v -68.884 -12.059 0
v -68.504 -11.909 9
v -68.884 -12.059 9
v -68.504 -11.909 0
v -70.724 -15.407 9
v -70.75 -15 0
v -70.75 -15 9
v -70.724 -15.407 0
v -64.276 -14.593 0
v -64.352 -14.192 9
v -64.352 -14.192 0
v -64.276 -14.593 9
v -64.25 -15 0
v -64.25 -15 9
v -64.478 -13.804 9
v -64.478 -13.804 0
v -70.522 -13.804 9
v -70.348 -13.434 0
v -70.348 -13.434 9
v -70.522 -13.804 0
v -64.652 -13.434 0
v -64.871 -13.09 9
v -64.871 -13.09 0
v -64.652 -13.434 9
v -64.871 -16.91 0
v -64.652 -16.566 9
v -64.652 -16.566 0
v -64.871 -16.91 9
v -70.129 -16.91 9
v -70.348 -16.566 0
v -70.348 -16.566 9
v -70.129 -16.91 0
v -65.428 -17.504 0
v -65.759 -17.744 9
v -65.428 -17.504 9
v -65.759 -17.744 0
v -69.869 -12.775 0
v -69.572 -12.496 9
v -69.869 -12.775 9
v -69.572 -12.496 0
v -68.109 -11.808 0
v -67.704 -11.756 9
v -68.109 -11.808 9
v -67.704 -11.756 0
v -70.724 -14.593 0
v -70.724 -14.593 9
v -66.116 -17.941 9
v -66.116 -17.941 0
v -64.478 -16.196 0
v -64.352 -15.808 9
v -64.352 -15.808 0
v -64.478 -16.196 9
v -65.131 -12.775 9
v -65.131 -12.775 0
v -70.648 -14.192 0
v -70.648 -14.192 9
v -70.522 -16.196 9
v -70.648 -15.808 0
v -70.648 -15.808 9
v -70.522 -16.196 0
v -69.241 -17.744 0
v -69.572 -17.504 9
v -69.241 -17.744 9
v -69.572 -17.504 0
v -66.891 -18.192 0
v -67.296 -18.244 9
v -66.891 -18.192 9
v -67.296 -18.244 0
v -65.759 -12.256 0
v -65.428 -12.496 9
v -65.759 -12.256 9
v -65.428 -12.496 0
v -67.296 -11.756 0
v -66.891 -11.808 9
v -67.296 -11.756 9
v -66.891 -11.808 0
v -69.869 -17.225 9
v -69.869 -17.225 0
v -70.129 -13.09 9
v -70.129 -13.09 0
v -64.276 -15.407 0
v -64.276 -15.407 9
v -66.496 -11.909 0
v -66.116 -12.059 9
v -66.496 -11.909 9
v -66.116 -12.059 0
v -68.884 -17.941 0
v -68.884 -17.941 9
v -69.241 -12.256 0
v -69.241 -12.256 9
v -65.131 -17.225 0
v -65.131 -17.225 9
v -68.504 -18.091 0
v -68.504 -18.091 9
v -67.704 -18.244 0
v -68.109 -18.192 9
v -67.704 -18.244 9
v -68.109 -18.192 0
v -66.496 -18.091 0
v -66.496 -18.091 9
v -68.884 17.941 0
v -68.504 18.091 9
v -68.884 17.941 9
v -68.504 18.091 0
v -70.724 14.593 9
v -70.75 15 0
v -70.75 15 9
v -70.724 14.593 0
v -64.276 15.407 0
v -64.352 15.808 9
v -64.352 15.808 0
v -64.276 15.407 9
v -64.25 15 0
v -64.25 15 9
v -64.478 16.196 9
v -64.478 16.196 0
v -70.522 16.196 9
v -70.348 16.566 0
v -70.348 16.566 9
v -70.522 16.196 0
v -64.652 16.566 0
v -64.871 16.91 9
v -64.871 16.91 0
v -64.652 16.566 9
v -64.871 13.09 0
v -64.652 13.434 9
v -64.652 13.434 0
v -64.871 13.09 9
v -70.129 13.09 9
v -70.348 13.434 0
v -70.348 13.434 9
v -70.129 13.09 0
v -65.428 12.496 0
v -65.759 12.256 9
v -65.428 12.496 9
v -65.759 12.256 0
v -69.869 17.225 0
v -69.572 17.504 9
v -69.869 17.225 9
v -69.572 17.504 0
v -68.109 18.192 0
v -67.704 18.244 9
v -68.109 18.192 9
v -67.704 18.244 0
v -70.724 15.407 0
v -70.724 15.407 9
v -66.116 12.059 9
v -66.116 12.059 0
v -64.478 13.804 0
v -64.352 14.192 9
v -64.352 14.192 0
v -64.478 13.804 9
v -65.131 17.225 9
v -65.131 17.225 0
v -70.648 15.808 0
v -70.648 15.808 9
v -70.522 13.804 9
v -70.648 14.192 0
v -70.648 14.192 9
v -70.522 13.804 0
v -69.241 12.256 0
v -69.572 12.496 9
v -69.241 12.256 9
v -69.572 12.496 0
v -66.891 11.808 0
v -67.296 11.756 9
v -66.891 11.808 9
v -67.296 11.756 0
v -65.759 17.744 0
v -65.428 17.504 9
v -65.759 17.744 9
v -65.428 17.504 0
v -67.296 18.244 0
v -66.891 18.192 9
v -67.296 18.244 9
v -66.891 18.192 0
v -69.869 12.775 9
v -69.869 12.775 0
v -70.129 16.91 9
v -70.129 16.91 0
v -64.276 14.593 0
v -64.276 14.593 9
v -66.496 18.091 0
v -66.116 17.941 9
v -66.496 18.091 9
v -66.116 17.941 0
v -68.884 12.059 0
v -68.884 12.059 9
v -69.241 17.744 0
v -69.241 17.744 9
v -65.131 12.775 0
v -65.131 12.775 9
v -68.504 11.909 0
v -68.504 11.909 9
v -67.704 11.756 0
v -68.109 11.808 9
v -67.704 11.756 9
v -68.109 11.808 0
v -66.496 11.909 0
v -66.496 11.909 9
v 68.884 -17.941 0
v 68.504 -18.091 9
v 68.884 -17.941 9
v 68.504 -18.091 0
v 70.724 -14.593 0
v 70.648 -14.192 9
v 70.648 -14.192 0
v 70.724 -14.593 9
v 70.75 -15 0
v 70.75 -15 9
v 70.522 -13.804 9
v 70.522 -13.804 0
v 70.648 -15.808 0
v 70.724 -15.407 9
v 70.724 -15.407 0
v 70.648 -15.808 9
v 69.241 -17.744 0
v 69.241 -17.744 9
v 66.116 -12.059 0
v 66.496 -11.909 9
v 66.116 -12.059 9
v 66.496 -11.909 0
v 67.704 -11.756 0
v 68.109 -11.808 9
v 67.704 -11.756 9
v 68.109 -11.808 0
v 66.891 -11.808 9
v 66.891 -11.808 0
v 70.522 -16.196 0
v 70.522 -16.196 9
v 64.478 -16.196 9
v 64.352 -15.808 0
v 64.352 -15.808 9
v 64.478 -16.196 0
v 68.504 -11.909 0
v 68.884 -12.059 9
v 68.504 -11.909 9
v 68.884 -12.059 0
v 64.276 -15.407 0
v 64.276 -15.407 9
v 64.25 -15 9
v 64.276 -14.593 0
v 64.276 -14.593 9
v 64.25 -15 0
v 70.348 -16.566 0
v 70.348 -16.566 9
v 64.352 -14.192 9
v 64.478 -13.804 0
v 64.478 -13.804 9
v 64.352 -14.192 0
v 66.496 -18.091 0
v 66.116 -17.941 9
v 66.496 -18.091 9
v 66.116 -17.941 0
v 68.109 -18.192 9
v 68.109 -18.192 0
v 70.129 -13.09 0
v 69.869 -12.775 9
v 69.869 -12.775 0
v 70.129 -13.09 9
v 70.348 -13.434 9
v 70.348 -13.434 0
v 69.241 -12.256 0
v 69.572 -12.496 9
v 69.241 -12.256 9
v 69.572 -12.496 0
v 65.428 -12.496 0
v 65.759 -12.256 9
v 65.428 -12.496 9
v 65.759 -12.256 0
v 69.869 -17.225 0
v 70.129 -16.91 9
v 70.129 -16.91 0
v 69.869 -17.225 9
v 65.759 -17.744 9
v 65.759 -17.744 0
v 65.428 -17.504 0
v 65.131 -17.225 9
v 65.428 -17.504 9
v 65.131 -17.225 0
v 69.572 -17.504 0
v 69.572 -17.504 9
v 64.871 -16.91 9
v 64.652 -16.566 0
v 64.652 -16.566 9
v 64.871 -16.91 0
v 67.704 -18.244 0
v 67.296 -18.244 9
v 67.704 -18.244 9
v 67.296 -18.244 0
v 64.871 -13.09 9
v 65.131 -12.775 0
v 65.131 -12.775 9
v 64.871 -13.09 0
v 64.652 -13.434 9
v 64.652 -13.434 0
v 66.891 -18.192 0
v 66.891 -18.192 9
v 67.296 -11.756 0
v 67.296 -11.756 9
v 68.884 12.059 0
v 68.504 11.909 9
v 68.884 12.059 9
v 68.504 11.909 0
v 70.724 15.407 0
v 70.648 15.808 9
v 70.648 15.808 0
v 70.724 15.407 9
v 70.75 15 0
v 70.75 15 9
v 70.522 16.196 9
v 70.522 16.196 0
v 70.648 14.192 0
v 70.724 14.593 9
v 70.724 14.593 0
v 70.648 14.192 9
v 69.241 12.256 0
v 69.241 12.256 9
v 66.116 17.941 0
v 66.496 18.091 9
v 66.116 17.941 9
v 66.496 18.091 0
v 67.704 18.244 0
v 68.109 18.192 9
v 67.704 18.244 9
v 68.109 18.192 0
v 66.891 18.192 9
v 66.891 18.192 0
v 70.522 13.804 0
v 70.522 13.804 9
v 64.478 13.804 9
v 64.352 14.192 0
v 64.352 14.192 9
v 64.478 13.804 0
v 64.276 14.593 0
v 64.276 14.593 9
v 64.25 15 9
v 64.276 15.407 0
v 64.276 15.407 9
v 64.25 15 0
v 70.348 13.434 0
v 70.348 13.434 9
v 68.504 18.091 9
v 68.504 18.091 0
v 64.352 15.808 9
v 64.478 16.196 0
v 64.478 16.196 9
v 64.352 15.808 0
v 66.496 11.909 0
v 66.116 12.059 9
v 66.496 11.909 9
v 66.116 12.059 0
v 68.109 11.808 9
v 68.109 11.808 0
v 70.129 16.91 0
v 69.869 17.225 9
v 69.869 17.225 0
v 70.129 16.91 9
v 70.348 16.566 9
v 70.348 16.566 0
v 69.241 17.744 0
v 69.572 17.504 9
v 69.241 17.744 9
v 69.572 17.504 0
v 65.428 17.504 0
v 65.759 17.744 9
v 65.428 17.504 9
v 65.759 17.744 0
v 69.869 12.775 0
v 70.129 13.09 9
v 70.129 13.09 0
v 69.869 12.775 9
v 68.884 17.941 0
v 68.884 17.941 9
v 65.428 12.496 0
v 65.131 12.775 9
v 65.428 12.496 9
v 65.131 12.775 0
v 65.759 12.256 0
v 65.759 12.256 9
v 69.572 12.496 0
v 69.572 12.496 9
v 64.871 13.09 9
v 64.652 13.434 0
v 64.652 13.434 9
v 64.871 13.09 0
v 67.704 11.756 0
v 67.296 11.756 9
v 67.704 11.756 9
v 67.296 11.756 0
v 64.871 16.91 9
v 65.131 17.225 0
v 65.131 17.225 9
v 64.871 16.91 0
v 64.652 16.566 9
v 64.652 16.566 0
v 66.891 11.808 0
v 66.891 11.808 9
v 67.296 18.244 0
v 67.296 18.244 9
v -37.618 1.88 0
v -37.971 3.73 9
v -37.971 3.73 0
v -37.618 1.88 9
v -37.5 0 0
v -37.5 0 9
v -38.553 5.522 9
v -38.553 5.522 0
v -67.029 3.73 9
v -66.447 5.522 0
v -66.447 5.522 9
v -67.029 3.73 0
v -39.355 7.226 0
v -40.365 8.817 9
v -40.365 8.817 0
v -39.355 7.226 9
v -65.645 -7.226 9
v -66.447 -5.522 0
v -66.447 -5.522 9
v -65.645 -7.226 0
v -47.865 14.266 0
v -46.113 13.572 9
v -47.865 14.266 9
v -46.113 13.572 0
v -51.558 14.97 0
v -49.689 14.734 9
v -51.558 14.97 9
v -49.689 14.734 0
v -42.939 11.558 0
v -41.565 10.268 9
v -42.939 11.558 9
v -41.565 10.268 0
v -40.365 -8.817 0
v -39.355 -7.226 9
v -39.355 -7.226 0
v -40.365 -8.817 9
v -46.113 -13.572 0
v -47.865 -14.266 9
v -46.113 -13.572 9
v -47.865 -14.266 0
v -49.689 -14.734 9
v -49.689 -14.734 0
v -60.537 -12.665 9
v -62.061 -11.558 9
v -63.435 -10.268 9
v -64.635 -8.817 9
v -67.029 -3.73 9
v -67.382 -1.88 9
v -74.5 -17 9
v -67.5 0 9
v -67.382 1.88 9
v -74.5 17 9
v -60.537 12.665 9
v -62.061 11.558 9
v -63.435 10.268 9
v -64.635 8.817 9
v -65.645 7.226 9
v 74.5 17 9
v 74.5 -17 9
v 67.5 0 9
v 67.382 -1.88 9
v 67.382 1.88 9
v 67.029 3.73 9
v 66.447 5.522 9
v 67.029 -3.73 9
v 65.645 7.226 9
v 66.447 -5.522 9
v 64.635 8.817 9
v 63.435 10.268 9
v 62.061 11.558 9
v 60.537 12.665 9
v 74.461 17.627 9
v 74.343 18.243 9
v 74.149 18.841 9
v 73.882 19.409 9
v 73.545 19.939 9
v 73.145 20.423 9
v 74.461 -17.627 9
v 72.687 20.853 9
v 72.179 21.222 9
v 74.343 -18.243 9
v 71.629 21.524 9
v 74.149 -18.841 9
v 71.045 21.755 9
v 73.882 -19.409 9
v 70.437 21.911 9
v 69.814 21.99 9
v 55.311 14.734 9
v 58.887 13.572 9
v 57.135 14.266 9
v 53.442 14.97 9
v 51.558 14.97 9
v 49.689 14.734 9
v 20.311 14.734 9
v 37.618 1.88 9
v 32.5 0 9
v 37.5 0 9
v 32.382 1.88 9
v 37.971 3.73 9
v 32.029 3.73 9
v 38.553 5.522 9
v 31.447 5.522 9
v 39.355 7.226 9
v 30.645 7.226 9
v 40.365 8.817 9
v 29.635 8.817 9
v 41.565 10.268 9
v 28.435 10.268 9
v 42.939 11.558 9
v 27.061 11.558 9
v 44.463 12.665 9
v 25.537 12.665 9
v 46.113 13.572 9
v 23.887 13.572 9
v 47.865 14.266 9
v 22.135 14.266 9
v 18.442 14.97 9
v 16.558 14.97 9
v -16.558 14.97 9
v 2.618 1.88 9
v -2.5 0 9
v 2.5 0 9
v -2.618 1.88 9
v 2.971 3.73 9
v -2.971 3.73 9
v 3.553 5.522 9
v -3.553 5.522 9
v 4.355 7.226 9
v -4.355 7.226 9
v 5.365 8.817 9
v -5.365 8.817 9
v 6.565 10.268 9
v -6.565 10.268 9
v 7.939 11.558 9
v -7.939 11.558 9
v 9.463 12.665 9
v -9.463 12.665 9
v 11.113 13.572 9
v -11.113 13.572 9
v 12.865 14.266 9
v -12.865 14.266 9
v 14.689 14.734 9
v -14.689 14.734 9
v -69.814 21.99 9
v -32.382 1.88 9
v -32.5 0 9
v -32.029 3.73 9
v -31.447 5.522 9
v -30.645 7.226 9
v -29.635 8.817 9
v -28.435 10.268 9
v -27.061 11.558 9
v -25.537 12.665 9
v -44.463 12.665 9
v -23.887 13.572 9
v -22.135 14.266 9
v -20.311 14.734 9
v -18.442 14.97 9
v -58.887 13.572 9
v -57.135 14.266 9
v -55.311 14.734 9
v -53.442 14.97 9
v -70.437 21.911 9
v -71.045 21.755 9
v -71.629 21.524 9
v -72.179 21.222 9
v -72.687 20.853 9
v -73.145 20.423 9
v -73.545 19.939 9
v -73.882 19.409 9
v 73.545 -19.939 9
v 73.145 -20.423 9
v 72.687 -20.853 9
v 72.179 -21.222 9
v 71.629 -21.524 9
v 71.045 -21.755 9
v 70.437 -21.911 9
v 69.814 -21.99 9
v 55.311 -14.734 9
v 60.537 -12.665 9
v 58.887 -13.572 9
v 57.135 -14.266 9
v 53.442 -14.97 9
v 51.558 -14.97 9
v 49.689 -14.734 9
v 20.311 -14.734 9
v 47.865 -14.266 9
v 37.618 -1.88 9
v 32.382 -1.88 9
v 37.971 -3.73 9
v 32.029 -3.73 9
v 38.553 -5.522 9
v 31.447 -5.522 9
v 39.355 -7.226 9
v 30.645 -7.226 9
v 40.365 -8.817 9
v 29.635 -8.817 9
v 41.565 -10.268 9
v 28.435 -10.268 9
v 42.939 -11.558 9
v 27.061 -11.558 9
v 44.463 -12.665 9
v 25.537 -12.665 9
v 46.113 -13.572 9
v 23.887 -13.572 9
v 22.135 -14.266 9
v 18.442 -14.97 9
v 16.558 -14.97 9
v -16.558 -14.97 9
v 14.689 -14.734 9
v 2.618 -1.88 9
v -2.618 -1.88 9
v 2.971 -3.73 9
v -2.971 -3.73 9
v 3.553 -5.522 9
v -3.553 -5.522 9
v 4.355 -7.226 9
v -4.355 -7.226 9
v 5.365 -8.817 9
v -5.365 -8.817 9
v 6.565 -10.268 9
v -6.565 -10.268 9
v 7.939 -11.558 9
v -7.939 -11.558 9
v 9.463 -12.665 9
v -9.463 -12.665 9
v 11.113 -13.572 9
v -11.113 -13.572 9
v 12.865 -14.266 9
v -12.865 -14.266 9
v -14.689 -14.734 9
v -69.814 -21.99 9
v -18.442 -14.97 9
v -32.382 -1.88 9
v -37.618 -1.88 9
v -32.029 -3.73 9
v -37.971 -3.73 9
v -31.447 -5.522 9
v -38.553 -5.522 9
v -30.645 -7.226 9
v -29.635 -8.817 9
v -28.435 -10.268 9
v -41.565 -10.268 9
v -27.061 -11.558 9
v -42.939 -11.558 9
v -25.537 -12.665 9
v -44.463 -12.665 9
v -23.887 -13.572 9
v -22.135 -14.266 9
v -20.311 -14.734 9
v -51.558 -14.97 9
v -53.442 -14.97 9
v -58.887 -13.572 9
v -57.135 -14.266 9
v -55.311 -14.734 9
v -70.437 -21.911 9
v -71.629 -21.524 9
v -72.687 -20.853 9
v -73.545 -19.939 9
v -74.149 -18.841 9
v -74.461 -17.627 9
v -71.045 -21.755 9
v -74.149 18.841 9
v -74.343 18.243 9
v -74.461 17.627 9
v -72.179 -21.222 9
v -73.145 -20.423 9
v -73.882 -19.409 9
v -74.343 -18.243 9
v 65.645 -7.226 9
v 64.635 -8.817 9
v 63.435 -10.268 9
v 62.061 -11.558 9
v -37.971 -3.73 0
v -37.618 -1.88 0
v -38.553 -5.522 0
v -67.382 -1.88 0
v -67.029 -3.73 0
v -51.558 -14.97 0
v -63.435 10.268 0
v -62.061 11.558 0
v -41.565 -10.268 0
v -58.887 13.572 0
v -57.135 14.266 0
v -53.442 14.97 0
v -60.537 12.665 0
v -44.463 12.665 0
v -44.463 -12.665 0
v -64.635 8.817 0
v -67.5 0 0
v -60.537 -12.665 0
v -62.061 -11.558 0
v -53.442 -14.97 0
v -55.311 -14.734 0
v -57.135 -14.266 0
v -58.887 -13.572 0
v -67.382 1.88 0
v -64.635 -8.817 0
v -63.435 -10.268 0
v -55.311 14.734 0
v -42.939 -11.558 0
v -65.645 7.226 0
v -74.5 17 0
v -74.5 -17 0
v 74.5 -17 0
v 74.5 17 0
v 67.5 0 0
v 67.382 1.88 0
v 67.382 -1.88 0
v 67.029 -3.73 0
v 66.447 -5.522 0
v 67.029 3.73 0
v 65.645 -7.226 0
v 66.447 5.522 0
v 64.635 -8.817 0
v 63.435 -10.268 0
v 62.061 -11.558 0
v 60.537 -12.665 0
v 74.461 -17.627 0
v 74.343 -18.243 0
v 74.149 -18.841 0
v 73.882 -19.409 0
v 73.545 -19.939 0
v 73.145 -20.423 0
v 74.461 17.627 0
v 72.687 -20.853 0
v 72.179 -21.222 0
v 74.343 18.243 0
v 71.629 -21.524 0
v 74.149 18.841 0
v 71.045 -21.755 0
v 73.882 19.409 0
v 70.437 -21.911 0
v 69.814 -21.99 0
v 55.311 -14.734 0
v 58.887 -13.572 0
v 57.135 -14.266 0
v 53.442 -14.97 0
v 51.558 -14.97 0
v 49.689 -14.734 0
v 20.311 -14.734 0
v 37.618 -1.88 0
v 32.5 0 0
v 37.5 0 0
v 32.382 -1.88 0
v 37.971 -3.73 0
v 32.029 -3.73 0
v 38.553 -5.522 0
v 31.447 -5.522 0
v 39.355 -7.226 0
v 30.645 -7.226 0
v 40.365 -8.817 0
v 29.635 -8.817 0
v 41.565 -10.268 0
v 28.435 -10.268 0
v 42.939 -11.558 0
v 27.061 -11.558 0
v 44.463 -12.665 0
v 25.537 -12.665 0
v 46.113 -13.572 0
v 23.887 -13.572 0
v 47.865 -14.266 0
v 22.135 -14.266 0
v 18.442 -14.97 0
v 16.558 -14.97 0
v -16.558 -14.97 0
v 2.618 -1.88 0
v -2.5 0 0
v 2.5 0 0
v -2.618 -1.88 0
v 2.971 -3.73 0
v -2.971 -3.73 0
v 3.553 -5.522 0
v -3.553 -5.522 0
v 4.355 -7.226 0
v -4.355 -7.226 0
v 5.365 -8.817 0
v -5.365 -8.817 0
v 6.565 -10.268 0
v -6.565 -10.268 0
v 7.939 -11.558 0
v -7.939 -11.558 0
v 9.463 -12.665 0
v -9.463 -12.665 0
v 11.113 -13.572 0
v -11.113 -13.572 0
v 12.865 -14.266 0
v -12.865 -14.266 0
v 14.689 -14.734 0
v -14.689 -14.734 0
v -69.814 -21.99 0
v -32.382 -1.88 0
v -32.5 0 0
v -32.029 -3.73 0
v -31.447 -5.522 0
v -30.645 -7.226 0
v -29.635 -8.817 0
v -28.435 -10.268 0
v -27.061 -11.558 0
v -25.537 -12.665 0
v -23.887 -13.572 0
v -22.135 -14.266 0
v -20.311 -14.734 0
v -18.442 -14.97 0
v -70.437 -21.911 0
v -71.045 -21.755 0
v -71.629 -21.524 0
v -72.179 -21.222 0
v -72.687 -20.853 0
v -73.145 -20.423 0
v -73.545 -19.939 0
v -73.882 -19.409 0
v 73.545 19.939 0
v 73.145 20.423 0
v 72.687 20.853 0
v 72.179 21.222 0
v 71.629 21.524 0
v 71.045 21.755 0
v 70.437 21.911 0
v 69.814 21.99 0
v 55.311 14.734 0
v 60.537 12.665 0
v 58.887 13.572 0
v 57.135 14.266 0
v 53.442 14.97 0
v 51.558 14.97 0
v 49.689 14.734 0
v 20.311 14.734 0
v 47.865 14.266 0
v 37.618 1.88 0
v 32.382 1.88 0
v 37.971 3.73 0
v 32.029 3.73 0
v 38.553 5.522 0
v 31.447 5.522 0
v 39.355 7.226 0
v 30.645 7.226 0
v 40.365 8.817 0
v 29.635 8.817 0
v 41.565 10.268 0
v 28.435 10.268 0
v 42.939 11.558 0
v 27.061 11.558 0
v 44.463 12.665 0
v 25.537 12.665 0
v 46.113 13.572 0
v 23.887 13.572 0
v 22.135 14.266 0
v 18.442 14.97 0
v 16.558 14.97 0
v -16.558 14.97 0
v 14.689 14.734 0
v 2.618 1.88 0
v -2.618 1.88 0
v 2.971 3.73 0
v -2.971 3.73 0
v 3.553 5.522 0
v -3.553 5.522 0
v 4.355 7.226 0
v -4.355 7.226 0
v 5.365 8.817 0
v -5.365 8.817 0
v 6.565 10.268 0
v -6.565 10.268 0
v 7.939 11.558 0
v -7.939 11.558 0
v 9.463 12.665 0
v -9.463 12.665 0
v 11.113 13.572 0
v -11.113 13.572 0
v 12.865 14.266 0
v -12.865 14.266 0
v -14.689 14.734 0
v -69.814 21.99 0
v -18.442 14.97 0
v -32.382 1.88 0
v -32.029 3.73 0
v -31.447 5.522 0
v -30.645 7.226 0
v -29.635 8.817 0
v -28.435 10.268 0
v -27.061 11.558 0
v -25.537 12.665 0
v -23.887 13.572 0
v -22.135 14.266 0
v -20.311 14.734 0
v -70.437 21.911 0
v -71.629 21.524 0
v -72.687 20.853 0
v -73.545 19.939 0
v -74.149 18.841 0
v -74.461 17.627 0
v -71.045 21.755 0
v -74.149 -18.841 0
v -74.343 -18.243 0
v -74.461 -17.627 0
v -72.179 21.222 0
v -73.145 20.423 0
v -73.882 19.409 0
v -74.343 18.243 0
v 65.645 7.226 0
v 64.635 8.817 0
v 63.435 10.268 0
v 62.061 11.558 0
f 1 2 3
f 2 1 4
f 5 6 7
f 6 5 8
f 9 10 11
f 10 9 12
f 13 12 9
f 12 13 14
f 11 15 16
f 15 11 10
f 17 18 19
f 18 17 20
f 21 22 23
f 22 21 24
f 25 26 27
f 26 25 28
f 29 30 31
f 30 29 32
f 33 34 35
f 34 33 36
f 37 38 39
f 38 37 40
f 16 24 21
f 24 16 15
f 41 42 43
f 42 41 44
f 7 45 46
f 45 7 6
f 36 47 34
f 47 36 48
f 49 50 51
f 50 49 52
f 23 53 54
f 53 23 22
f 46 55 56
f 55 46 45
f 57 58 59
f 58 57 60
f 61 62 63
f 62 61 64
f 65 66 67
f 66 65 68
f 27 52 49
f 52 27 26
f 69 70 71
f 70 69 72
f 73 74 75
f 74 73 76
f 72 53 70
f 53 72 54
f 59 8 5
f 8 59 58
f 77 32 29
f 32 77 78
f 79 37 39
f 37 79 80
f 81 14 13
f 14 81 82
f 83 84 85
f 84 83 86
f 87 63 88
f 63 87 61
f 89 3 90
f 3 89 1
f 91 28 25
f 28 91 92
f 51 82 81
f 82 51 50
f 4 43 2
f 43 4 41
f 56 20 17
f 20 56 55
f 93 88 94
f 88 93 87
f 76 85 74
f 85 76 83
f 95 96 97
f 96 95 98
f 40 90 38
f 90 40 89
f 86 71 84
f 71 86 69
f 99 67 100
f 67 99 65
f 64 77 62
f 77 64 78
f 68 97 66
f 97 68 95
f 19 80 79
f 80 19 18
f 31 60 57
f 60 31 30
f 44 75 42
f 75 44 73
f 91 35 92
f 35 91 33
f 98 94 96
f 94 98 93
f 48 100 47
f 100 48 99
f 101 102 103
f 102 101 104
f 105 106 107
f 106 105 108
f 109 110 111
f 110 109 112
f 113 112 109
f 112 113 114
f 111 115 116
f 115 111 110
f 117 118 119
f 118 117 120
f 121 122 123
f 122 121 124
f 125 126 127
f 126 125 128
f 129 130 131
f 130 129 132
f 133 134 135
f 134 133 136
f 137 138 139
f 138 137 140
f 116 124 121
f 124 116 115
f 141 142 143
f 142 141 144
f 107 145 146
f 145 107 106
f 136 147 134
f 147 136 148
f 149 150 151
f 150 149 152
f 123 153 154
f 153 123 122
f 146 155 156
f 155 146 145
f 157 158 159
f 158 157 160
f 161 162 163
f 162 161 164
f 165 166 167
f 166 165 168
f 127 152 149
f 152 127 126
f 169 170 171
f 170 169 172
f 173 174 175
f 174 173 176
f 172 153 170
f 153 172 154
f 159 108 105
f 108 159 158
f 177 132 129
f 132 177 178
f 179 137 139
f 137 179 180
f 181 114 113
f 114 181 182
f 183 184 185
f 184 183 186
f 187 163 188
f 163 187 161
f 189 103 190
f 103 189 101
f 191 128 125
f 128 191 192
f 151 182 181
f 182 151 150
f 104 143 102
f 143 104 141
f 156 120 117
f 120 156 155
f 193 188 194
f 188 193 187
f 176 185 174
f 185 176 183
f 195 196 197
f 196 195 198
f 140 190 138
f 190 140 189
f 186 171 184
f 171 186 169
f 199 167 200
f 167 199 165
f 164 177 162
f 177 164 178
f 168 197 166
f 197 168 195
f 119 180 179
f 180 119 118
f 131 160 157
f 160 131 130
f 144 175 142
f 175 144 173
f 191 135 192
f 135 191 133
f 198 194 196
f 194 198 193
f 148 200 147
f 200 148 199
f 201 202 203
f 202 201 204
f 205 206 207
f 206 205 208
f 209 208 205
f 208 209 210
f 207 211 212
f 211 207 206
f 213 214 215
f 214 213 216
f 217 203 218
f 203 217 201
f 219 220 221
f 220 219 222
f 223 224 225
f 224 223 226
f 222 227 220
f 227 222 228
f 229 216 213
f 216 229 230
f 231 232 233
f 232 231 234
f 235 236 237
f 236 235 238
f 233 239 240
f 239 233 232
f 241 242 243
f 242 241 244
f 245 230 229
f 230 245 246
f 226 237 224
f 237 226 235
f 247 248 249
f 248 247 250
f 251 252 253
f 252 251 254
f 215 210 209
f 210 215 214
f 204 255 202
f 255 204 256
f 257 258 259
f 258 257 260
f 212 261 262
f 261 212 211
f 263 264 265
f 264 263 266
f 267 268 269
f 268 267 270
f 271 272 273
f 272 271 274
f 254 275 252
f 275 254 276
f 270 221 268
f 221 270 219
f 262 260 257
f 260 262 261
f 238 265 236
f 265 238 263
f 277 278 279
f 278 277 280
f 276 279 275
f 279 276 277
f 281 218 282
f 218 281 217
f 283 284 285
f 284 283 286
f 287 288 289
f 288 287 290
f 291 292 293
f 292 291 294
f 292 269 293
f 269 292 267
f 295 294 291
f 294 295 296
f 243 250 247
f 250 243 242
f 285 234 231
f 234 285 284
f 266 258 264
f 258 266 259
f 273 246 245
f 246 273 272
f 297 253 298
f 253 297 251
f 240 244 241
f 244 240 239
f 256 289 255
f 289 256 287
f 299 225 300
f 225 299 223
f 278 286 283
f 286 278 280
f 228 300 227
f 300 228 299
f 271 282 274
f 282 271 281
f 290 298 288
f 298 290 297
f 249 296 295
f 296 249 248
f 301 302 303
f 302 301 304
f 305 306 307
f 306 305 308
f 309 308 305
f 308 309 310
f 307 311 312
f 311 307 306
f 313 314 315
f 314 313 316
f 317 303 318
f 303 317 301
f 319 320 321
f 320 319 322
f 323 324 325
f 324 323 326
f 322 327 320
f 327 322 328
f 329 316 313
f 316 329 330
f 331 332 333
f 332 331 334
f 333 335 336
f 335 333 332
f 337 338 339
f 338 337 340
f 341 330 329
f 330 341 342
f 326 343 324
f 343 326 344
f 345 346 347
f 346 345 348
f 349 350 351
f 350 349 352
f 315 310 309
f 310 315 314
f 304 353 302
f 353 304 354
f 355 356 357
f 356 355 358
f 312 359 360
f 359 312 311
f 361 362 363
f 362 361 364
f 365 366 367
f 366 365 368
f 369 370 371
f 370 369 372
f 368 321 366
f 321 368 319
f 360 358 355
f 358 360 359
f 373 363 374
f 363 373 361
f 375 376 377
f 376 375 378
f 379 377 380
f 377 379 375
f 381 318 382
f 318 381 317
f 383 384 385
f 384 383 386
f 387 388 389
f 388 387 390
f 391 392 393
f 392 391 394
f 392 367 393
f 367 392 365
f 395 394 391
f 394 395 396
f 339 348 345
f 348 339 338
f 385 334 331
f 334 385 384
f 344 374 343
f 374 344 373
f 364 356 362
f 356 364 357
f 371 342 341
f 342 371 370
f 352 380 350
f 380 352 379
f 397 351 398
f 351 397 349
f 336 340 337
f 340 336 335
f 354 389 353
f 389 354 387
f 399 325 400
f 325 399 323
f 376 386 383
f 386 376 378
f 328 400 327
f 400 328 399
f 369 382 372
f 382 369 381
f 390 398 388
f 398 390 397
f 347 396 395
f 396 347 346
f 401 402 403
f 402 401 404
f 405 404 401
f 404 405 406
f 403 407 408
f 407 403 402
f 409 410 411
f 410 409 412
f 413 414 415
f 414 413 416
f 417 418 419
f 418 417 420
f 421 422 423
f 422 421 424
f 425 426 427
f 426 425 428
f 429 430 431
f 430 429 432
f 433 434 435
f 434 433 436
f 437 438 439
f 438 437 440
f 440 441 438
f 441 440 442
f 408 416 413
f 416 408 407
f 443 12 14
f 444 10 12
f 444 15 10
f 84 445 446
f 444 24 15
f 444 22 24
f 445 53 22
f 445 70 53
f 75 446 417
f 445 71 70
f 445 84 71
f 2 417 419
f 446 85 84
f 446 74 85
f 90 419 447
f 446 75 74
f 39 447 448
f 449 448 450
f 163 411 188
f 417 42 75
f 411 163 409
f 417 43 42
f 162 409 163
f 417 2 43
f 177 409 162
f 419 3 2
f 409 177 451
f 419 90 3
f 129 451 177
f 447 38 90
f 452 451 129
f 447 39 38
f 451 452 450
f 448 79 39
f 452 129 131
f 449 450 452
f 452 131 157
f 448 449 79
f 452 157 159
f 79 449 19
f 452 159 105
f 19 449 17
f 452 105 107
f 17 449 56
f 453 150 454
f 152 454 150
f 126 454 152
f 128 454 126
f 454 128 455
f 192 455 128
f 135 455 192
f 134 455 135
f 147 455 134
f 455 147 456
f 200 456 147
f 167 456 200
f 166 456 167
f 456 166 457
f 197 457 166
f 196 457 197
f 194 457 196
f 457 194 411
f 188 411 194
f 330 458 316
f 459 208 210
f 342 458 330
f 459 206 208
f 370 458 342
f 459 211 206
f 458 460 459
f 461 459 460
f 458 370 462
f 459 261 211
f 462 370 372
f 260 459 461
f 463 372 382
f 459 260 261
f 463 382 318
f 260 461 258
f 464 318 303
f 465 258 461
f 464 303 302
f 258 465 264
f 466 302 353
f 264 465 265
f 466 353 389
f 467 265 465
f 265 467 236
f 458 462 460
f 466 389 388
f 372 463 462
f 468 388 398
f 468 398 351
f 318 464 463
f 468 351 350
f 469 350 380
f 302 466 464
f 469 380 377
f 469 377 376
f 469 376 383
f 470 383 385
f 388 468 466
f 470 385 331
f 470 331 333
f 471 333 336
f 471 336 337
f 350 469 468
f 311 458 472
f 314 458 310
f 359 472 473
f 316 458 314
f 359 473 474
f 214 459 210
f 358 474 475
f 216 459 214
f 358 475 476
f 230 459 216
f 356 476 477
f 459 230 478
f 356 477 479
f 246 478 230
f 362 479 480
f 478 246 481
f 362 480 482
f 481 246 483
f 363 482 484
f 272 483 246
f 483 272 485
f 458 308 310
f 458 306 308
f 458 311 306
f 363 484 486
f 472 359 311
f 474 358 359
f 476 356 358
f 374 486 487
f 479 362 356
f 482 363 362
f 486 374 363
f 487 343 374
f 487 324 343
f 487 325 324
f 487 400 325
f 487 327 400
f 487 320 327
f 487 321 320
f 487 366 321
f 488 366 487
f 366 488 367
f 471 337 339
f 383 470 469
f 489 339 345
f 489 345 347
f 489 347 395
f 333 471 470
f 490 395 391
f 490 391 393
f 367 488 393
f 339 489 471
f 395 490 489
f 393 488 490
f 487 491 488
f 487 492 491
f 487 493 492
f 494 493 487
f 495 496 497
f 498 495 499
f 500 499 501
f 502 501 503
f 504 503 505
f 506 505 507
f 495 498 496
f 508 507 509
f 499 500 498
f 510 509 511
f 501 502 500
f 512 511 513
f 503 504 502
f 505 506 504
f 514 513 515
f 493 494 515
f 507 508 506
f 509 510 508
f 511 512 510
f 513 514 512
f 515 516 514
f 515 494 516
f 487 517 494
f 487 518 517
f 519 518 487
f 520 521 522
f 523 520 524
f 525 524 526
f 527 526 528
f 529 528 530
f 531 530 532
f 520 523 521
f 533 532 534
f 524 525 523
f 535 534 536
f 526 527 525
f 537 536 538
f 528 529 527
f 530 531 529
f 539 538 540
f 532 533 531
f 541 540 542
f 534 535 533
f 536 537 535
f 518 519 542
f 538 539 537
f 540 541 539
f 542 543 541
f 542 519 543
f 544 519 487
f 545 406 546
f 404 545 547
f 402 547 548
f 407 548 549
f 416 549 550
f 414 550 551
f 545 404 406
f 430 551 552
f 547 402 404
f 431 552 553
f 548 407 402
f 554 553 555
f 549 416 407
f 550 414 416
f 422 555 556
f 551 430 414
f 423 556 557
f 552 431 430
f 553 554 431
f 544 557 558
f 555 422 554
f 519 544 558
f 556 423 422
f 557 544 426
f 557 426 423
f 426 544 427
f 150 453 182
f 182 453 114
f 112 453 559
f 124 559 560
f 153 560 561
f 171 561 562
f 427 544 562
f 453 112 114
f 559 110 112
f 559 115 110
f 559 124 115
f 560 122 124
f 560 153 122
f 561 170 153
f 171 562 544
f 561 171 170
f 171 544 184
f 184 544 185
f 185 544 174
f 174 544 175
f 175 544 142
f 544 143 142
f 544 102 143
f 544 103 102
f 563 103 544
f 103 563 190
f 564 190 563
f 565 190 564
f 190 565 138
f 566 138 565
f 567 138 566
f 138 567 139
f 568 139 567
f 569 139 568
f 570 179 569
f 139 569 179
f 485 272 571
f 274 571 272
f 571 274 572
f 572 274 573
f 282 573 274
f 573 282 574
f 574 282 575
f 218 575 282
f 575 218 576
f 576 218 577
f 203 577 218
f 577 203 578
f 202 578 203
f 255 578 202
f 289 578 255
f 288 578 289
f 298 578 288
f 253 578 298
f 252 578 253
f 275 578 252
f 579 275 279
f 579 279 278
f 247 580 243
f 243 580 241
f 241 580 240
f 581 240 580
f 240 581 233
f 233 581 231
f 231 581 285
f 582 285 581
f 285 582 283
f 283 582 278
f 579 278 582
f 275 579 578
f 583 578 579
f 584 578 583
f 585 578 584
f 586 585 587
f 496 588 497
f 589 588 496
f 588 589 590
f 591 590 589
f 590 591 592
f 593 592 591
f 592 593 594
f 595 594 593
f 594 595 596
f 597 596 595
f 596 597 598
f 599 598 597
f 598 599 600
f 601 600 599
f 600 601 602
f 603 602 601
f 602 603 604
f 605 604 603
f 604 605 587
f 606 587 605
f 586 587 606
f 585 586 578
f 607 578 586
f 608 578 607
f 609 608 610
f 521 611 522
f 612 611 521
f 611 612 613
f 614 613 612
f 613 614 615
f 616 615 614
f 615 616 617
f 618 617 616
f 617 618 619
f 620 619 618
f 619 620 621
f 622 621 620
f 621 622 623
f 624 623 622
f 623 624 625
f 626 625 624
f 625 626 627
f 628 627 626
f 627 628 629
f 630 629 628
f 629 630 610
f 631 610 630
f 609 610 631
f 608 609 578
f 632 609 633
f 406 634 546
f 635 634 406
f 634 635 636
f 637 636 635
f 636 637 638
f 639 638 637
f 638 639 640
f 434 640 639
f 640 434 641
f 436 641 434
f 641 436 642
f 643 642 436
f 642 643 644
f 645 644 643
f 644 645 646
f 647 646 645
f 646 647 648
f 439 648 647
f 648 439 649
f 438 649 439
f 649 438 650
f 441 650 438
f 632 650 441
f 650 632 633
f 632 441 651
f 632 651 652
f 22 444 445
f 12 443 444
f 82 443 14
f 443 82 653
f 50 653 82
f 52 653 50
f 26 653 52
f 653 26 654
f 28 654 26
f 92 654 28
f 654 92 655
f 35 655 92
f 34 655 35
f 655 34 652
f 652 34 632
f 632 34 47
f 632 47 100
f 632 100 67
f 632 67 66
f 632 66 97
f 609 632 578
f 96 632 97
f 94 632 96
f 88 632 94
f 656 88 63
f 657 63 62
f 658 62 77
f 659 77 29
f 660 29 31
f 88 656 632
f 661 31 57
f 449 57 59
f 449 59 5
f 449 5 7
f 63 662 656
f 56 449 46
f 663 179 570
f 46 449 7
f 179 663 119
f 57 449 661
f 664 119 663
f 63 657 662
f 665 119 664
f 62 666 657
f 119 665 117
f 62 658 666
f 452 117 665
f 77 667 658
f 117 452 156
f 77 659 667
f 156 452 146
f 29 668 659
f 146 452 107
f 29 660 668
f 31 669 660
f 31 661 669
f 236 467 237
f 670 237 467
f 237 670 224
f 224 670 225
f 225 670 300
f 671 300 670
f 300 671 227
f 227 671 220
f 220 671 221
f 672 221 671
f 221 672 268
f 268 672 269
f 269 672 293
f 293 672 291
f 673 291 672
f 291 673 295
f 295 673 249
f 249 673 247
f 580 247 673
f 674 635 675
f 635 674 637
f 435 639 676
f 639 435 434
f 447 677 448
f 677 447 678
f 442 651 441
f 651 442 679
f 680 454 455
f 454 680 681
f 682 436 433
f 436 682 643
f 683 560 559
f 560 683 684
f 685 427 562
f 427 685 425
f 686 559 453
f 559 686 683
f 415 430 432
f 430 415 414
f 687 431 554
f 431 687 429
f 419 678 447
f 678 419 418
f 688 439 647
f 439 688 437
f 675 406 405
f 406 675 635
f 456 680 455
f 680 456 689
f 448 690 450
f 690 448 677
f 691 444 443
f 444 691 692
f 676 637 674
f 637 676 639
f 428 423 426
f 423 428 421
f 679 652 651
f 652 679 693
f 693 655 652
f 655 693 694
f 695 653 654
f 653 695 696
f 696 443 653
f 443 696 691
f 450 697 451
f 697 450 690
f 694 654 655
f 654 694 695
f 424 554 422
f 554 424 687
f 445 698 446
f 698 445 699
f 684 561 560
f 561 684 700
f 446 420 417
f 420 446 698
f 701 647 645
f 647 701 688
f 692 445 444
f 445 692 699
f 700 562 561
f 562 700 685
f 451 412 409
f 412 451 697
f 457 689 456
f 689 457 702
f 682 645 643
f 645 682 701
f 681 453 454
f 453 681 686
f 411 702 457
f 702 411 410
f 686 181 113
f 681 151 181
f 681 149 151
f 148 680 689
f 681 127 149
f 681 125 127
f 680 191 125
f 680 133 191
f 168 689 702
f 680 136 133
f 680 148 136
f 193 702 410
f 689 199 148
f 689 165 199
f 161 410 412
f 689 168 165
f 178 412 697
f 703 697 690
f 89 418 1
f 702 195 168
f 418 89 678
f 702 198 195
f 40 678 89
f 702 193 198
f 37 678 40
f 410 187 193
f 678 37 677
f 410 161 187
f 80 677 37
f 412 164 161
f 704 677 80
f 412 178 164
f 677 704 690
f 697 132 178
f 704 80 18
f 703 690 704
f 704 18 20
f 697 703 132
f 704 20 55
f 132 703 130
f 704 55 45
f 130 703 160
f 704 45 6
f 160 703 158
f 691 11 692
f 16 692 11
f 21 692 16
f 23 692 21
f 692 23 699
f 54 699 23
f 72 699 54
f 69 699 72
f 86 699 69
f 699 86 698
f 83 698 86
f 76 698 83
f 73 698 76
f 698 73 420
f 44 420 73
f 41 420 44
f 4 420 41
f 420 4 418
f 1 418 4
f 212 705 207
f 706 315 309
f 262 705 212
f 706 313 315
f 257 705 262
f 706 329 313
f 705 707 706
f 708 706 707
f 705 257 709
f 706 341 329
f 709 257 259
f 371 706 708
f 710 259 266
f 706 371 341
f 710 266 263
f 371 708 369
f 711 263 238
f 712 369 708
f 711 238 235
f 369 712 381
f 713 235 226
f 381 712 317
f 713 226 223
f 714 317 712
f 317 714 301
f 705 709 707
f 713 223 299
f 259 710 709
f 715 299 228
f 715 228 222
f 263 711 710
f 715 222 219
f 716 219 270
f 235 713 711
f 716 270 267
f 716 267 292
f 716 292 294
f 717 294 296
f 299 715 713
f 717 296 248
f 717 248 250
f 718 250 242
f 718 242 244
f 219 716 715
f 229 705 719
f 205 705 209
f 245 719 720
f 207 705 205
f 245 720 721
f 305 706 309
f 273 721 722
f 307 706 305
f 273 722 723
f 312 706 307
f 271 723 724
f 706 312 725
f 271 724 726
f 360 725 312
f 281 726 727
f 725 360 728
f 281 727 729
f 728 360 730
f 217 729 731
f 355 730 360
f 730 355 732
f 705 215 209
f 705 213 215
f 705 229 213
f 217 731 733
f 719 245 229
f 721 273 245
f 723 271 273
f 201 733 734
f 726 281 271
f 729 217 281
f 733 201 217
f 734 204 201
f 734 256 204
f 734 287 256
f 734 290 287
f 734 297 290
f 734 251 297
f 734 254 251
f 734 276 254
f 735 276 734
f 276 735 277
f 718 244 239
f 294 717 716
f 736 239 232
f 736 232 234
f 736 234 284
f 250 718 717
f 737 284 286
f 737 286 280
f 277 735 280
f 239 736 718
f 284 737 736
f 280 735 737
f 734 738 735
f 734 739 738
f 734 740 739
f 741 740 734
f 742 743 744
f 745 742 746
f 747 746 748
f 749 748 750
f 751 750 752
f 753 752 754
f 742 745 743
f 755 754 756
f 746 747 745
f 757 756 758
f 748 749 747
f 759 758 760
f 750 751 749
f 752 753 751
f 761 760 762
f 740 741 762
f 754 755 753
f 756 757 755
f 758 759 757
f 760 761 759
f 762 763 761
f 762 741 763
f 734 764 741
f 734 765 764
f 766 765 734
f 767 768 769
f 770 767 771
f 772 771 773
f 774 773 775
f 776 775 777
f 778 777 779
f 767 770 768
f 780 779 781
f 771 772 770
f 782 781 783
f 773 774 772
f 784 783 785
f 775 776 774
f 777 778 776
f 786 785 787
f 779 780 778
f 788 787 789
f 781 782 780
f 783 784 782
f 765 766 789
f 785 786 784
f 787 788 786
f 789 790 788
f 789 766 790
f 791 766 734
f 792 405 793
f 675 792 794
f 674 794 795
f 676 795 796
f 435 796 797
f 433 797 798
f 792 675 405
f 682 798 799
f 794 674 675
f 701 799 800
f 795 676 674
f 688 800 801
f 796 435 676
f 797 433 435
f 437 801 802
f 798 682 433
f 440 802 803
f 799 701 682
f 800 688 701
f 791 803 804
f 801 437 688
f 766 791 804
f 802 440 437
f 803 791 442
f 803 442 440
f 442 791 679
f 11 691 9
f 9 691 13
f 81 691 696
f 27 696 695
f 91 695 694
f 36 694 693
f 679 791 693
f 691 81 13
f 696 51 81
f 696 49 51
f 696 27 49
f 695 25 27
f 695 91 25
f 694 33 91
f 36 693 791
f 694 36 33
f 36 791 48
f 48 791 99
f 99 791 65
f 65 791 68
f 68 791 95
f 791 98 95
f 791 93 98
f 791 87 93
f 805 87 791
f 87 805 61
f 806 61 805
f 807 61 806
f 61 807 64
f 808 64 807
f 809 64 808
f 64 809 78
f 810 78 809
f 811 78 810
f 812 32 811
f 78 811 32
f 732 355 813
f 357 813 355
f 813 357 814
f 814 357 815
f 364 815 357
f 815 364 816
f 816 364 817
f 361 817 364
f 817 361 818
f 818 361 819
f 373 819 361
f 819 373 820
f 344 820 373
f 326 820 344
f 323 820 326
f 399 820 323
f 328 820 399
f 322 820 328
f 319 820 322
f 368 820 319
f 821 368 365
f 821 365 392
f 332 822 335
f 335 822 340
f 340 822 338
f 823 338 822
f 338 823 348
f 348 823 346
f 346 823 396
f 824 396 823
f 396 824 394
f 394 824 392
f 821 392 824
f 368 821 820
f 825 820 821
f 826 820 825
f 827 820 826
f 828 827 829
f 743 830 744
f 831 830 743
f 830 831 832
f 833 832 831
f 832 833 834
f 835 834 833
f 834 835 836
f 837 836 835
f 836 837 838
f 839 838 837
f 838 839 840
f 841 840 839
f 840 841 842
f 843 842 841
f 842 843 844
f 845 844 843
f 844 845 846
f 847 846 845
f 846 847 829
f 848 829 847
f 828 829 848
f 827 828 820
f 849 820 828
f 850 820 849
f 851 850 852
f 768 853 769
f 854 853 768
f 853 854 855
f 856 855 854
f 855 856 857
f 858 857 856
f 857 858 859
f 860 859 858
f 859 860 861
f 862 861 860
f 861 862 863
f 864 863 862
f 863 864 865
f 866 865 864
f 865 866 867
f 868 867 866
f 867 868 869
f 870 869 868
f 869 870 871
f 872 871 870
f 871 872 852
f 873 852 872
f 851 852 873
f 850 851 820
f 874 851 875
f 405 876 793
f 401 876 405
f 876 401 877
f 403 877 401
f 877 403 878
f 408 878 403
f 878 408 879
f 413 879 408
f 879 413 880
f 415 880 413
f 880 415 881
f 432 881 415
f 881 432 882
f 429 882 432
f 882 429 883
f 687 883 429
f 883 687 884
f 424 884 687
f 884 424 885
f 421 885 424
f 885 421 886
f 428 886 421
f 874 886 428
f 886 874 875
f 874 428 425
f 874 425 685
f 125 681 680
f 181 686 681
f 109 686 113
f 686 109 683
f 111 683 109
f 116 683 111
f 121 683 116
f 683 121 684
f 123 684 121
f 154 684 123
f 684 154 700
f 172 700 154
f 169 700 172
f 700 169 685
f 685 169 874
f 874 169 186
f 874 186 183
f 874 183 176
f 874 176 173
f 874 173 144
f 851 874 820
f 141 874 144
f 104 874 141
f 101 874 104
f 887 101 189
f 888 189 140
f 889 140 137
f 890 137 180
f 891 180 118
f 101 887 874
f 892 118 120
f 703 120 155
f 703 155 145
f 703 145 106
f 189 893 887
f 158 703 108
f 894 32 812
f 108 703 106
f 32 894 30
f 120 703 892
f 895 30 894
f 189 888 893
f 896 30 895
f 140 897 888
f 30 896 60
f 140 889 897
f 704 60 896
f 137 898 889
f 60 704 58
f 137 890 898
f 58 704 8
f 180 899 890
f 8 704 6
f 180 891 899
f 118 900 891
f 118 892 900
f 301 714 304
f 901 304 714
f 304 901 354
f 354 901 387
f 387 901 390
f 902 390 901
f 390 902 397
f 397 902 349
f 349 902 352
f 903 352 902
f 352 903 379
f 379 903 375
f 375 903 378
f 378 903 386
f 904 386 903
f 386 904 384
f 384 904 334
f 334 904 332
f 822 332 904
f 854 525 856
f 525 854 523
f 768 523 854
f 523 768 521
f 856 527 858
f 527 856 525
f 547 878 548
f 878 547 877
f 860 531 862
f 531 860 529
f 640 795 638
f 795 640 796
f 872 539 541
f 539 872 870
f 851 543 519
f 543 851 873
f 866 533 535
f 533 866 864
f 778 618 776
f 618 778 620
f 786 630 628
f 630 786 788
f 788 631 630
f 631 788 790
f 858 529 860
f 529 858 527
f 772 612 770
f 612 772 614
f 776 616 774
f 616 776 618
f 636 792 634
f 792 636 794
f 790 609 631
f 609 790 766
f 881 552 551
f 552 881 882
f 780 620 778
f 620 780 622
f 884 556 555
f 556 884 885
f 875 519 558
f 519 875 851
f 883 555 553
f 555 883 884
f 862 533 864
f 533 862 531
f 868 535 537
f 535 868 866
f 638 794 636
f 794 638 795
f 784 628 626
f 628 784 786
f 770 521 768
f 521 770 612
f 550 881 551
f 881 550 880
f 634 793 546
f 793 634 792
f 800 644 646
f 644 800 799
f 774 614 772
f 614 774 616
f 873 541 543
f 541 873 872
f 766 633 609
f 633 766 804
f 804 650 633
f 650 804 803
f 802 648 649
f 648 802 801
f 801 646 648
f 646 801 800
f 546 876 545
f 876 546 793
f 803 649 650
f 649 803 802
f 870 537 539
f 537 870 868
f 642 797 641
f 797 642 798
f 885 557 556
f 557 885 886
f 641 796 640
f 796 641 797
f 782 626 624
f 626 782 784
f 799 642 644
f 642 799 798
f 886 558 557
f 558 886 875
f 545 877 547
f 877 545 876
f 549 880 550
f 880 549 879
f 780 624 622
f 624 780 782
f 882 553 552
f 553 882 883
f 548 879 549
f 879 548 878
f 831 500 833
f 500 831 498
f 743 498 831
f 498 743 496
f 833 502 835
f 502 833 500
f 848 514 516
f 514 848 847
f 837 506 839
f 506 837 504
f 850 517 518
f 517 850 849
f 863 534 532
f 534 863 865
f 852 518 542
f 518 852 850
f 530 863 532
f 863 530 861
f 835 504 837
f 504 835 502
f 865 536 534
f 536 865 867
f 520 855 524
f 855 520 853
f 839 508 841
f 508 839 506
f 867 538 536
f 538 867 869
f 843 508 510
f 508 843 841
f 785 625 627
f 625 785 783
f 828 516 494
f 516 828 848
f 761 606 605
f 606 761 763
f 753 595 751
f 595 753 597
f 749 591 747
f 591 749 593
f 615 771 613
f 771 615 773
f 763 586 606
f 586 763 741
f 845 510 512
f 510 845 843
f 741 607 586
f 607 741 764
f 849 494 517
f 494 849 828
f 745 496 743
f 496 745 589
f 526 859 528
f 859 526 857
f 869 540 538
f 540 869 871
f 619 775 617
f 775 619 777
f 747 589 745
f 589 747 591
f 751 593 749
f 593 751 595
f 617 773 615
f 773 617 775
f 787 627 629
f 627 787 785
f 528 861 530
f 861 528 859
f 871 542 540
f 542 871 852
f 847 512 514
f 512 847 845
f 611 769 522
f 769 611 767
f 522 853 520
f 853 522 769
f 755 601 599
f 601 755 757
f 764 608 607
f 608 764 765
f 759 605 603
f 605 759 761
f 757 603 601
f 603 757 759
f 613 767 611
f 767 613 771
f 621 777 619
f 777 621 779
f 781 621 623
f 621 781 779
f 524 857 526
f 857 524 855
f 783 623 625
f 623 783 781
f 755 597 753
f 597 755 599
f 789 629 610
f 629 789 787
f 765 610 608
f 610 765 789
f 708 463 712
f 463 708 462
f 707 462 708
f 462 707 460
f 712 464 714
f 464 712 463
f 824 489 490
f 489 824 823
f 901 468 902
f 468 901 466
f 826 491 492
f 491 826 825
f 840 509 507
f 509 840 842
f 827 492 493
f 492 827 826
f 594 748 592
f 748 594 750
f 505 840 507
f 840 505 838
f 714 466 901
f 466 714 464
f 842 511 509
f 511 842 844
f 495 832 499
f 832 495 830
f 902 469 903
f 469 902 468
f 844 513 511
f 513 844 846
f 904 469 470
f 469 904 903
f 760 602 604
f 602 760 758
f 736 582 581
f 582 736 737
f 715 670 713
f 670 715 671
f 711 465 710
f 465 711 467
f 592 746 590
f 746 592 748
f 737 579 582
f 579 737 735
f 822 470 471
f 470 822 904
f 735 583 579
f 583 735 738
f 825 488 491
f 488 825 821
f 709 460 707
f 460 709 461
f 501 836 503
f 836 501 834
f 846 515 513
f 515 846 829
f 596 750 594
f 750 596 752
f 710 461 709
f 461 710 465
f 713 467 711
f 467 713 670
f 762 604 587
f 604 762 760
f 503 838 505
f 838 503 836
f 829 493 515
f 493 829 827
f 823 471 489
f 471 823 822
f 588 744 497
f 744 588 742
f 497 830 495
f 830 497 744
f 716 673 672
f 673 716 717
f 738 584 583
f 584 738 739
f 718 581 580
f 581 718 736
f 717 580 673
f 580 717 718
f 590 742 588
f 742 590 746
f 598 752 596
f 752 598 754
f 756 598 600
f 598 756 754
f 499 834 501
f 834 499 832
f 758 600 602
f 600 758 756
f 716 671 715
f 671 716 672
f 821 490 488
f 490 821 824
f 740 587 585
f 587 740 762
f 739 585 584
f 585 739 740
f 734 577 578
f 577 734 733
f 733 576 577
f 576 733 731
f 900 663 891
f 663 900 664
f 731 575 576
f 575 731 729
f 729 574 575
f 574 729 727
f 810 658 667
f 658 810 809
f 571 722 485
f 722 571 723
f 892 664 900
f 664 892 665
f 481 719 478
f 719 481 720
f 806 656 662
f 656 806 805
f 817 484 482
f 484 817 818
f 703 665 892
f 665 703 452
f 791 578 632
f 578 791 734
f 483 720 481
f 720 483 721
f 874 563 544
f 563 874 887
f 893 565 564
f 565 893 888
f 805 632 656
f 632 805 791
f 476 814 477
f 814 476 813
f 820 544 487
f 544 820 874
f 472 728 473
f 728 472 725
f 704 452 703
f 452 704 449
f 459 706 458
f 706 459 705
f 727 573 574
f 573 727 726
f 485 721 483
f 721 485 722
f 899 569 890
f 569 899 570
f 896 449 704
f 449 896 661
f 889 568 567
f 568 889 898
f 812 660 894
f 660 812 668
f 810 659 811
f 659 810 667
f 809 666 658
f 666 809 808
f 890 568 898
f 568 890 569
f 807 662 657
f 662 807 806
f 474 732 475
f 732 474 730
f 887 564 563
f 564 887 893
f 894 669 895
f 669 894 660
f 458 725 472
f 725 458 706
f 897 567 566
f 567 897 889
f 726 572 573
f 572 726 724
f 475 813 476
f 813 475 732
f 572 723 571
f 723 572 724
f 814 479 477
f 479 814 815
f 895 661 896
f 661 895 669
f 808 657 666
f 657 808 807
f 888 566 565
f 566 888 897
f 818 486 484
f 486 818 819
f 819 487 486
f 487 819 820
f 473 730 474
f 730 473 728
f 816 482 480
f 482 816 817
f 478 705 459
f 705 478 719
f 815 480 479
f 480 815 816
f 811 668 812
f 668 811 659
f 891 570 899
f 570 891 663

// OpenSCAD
$fn = 50;

difference() {
	union() {
		hull() {
			translate(v = [-69.5, 17.0, 0]) {
				cylinder(h = 9, r = 5);
			}
			translate(v = [69.5, 17.0, 0]) {
				cylinder(h = 9, r = 5);
			}
			translate(v = [-69.5, -17.0, 0]) {
				cylinder(h = 9, r = 5);
			}
			translate(v = [69.5, -17.0, 0]) {
				cylinder(h = 9, r = 5);
			}
		}
	}
	union() {
		translate(v = [-67.5, -15.0, -100.0]) {
			cylinder(h = 200, r = 3.25);
		}
		translate(v = [-67.5, 15.0, -100.0]) {
			cylinder(h = 200, r = 3.25);
		}
		translate(v = [67.5, -15.0, -100.0]) {
			cylinder(h = 200, r = 3.25);
		}
		translate(v = [67.5, 15.0, -100.0]) {
			cylinder(h = 200, r = 3.25);
		}
		translate(v = [-67.5, -15.0, -100.0]) {
			cylinder(h = 200, r = 1.8);
		}
		translate(v = [-67.5, 15.0, -100.0]) {
			cylinder(h = 200, r = 1.8);
		}
		translate(v = [67.5, -15.0, -100.0]) {
			cylinder(h = 200, r = 1.8);
		}
		translate(v = [67.5, 15.0, -100.0]) {
			cylinder(h = 200, r = 1.8);
		}
		translate(v = [-52.5, 0, 0.0]) {
			cylinder(h = 9, r = 15.0);
		}
		translate(v = [-17.5, 0, 0.0]) {
			cylinder(h = 9, r = 15.0);
		}
		translate(v = [17.5, 0, 0.0]) {
			cylinder(h = 9, r = 15.0);
		}
		translate(v = [52.5, 0, 0.0]) {
			cylinder(h = 9, r = 15.0);
		}
	}
}
